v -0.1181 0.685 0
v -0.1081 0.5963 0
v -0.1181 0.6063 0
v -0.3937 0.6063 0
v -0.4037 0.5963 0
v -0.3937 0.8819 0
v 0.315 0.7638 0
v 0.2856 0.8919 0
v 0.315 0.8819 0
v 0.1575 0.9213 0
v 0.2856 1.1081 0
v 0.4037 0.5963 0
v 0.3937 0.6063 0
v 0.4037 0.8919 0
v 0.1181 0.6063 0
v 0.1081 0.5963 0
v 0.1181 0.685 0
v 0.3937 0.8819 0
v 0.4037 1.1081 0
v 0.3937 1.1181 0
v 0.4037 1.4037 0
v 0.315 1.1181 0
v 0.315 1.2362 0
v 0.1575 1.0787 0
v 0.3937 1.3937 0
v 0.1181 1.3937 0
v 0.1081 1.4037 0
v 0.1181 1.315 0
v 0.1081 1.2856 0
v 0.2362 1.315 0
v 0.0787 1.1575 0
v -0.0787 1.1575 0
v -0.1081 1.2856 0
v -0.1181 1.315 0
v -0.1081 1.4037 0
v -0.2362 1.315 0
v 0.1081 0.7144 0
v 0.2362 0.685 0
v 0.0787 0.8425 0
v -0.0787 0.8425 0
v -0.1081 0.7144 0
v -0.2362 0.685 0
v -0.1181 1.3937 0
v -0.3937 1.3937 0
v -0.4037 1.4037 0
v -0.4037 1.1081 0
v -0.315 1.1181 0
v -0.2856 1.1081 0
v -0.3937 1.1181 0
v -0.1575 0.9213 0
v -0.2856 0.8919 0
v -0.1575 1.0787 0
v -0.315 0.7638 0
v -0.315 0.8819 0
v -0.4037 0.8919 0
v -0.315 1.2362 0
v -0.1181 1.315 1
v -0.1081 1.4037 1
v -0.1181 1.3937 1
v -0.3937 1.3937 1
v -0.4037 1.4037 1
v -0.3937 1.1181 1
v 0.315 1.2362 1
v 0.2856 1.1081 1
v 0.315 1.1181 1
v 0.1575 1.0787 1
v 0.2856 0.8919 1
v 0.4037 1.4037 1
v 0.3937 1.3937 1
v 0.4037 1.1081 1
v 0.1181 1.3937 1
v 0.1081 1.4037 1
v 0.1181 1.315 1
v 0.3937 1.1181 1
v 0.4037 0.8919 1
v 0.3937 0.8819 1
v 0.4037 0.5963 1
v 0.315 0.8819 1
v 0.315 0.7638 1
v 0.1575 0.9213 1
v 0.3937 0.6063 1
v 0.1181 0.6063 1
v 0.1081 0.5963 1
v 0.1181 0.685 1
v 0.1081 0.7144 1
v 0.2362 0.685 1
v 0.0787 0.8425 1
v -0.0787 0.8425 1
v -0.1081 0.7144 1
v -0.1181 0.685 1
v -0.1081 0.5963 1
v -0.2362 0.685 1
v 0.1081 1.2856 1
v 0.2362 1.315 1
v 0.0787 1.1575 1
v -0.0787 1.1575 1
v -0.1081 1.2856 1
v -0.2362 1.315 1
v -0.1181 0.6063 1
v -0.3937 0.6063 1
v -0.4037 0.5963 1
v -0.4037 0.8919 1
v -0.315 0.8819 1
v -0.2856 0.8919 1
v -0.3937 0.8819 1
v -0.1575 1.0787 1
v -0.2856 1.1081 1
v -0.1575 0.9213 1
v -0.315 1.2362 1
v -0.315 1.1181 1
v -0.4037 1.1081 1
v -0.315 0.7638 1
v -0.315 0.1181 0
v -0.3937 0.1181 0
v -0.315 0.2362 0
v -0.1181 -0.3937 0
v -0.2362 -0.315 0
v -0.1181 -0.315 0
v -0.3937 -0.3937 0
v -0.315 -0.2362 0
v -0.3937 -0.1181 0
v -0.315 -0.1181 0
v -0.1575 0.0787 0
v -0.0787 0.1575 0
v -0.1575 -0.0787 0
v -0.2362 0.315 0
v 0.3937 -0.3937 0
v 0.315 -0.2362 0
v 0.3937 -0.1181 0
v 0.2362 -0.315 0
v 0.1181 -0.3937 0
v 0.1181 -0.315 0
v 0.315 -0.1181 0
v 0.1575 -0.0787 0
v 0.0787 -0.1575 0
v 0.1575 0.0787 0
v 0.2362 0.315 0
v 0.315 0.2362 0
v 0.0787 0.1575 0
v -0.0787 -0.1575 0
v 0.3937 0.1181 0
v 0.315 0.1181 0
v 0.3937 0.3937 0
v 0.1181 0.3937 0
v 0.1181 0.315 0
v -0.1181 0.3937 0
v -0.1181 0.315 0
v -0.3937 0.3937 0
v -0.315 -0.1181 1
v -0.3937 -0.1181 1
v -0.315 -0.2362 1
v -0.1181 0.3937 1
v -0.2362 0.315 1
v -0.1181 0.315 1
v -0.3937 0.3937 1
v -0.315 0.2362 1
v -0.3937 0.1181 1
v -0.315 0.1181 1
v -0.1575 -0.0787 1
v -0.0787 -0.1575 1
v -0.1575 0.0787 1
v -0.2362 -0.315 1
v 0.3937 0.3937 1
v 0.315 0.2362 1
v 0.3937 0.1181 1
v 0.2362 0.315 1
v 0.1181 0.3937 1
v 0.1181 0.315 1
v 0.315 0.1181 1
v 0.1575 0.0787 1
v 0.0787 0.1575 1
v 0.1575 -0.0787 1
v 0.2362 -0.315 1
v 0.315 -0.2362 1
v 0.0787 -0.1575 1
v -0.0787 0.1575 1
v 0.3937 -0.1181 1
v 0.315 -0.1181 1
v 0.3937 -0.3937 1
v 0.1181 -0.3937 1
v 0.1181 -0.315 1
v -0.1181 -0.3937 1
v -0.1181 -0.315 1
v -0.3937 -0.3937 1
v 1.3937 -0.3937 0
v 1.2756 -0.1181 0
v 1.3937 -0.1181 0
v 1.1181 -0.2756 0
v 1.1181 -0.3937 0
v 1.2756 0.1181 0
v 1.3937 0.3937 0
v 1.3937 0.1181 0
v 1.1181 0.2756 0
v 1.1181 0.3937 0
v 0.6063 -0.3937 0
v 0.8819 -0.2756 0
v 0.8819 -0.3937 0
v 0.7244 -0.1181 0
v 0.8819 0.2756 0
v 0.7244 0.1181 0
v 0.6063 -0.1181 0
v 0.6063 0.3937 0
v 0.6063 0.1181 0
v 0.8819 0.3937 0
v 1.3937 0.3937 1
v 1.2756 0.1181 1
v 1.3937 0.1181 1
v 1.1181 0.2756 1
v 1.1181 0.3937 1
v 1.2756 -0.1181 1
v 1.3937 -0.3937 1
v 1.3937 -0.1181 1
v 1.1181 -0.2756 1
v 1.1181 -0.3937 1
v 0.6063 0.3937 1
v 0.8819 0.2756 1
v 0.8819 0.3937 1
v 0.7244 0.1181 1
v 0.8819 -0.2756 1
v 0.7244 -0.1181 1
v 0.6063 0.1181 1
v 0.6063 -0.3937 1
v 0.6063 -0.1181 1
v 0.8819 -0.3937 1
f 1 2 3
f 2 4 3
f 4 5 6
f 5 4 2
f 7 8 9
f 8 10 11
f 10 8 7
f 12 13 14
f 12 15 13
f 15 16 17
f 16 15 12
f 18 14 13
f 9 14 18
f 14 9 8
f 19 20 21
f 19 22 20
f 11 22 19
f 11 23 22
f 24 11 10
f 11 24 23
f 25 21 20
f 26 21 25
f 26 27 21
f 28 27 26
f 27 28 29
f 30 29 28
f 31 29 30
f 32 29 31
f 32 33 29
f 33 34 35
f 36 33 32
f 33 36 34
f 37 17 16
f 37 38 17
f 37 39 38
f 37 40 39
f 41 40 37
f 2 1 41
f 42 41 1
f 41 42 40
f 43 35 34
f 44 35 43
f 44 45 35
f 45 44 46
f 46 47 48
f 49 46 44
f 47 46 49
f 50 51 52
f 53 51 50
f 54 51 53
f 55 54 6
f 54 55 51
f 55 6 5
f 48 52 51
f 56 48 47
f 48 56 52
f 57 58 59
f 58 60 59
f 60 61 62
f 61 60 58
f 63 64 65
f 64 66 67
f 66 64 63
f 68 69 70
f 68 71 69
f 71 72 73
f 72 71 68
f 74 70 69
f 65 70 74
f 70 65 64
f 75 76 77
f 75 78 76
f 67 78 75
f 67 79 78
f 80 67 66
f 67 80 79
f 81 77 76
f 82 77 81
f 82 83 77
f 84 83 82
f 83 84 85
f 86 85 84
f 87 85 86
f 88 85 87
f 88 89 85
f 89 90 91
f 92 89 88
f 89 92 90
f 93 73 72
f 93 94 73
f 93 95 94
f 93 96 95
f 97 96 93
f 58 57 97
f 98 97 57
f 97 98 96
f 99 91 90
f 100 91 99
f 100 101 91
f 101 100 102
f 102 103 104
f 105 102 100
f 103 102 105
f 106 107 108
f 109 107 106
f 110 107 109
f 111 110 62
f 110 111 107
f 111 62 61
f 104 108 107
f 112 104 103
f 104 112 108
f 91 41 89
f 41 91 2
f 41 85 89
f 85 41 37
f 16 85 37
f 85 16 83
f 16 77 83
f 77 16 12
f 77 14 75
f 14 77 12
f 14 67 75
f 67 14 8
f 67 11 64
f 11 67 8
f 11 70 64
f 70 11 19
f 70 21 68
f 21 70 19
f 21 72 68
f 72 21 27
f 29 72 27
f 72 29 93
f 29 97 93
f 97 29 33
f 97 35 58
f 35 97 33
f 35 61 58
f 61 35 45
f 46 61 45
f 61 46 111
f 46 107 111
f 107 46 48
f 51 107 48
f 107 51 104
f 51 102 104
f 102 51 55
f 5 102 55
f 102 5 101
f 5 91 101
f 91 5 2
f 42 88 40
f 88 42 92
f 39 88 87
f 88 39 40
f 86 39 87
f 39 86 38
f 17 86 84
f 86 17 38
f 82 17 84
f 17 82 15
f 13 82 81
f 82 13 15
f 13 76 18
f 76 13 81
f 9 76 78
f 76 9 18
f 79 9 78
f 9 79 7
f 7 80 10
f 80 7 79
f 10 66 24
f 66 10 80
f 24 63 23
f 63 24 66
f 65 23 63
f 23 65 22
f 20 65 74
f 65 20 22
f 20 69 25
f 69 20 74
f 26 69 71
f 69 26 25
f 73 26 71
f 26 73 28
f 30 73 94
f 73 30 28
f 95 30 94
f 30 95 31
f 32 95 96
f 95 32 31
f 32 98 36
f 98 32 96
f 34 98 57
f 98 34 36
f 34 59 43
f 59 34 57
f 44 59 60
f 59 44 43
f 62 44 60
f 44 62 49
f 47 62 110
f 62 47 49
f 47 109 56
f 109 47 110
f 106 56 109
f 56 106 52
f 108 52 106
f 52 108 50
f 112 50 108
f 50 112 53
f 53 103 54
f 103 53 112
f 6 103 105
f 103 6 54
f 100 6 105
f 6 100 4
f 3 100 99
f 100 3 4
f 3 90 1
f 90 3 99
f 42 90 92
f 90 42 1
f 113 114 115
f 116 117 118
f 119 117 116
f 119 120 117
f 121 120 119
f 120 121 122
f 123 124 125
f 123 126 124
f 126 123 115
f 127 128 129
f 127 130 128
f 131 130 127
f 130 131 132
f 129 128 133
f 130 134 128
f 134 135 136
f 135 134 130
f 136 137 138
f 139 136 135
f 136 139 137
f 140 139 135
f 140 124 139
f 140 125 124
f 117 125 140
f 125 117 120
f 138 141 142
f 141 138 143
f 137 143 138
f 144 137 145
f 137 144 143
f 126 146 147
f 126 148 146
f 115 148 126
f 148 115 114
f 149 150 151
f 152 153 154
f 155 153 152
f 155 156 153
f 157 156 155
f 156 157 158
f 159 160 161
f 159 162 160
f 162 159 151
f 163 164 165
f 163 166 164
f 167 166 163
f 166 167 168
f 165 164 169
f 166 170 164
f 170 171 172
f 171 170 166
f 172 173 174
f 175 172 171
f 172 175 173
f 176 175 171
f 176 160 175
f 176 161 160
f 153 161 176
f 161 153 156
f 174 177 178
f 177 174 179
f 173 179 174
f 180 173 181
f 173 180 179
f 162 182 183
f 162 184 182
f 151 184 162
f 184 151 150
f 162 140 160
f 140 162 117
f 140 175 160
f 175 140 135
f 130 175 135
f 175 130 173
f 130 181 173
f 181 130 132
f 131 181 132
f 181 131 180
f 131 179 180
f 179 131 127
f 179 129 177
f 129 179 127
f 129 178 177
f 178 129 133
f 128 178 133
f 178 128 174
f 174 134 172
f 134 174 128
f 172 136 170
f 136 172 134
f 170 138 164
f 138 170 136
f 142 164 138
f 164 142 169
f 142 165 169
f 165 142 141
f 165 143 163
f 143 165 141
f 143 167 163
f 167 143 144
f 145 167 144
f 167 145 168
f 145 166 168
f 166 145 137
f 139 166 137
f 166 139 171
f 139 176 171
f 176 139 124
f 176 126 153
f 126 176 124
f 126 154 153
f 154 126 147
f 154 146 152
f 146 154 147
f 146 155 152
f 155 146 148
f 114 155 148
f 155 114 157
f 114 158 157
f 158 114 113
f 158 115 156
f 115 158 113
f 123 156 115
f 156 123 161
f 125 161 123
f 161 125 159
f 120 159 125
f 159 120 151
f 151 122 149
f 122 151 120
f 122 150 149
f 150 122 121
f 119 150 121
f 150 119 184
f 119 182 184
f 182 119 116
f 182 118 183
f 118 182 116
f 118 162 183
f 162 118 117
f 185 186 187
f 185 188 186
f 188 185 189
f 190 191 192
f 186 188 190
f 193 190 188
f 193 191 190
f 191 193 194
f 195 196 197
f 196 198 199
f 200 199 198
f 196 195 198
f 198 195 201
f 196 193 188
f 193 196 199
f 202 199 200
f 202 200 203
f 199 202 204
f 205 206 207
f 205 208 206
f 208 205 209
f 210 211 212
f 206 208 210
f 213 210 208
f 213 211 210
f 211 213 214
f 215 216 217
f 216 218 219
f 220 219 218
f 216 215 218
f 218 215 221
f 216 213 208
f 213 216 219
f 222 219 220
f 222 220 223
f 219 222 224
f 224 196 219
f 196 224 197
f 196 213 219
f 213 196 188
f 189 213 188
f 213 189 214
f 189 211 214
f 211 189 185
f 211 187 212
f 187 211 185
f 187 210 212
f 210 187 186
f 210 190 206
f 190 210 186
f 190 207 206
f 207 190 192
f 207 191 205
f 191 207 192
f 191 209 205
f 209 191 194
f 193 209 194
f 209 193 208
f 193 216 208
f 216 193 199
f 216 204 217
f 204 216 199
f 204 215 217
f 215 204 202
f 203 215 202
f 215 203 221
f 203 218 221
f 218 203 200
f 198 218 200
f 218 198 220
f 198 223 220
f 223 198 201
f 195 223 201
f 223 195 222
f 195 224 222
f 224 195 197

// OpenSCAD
module extrusion5Series(xSegments, ySegments, zLength)
scale(1/25.4) //I hate this
linear_extrude(zLength * 25.4) //I hate this too
translate([-xSegments*10, -ySegments*10])
difference(){
	square([xSegments*20, ySegments*20]);
	
	for(i = [0:1:xSegments-1])
	translate([i*20, 0]){
		translate([7, 0])
		square([6, 2]);
		
		translate([4, 2])
		polygon([[0, 0], [4, 4], [8, 4], [12, 0]]);
		
		translate([0, ySegments*20]){
			translate([7, -2])
			square([6, 2]);
			
			translate([4, -6])
			polygon([[0, 4], [4, 0], [8, 0], [12, 4]]);
		}
	}
	
	for(i = [0:1:ySegments-1])
	translate([0, i*20]){
		translate([0, 7])
		square([2, 6]);
		
		translate([2, 4])
		polygon([[0, 0], [4, 4], [4, 8], [0, 12]]);
		
		translate([xSegments*20, 0]){
			translate([-2, 7])
			square([2, 6]);
			
			translate([-6, 4])
			polygon([[4, 0], [0, 4], [0, 8], [4, 12]]);
		}
	}
}

module extrusion5SeriesCrude(xSegments, ySegments, zLength, xyClearUS = 0){ //This is intended to have simpler geometry to mimic the old 2020 model more and allow fitment to happen
	xyClear = xyClearUS * 25.4;
	scale(1/25.4) //More
	linear_extrude(zLength * 25.4) //Even MORE
	translate([-xSegments*10 - xyClear, -ySegments*10 - xyClear])
	difference(){
		square([xSegments*20 + xyClear*2, ySegments*20 + xyClear*2]);
		
		for(i = [0:1:xSegments-1])
		translate([i*20, 0]){
			translate([7 + xyClear*2, 0])
			square([6 - xyClear*2, 3]);
			
			translate([7 + xyClear*2, ySegments*20 - 3 + xyClear*2])
			square([6 - xyClear*2, 3]);
		}
		
		for(i = [0:1:ySegments-1])
		translate([0, i*20 + 7 + xyClear*2]){
			square([3, 6 - xyClear*2]);
			
			translate([xSegments*20 - 3 + xyClear*2, 0])
			square([3, 6 - xyClear*2]);
		}
	}
}

extrusion5Series(1, 1, 1);

translate([1, 0])
extrusion5SeriesCrude(1, 1, 1);

translate([0, 1])
difference(){
	extrusion5SeriesCrude(1, 1, 1, 0.01);
	extrusion5Series(1, 1, 1);
}

translate([1, 1])
difference(){
	extrusion5Series(1, 1, 1);
	extrusion5SeriesCrude(1, 1, 1, 0.01);
}
